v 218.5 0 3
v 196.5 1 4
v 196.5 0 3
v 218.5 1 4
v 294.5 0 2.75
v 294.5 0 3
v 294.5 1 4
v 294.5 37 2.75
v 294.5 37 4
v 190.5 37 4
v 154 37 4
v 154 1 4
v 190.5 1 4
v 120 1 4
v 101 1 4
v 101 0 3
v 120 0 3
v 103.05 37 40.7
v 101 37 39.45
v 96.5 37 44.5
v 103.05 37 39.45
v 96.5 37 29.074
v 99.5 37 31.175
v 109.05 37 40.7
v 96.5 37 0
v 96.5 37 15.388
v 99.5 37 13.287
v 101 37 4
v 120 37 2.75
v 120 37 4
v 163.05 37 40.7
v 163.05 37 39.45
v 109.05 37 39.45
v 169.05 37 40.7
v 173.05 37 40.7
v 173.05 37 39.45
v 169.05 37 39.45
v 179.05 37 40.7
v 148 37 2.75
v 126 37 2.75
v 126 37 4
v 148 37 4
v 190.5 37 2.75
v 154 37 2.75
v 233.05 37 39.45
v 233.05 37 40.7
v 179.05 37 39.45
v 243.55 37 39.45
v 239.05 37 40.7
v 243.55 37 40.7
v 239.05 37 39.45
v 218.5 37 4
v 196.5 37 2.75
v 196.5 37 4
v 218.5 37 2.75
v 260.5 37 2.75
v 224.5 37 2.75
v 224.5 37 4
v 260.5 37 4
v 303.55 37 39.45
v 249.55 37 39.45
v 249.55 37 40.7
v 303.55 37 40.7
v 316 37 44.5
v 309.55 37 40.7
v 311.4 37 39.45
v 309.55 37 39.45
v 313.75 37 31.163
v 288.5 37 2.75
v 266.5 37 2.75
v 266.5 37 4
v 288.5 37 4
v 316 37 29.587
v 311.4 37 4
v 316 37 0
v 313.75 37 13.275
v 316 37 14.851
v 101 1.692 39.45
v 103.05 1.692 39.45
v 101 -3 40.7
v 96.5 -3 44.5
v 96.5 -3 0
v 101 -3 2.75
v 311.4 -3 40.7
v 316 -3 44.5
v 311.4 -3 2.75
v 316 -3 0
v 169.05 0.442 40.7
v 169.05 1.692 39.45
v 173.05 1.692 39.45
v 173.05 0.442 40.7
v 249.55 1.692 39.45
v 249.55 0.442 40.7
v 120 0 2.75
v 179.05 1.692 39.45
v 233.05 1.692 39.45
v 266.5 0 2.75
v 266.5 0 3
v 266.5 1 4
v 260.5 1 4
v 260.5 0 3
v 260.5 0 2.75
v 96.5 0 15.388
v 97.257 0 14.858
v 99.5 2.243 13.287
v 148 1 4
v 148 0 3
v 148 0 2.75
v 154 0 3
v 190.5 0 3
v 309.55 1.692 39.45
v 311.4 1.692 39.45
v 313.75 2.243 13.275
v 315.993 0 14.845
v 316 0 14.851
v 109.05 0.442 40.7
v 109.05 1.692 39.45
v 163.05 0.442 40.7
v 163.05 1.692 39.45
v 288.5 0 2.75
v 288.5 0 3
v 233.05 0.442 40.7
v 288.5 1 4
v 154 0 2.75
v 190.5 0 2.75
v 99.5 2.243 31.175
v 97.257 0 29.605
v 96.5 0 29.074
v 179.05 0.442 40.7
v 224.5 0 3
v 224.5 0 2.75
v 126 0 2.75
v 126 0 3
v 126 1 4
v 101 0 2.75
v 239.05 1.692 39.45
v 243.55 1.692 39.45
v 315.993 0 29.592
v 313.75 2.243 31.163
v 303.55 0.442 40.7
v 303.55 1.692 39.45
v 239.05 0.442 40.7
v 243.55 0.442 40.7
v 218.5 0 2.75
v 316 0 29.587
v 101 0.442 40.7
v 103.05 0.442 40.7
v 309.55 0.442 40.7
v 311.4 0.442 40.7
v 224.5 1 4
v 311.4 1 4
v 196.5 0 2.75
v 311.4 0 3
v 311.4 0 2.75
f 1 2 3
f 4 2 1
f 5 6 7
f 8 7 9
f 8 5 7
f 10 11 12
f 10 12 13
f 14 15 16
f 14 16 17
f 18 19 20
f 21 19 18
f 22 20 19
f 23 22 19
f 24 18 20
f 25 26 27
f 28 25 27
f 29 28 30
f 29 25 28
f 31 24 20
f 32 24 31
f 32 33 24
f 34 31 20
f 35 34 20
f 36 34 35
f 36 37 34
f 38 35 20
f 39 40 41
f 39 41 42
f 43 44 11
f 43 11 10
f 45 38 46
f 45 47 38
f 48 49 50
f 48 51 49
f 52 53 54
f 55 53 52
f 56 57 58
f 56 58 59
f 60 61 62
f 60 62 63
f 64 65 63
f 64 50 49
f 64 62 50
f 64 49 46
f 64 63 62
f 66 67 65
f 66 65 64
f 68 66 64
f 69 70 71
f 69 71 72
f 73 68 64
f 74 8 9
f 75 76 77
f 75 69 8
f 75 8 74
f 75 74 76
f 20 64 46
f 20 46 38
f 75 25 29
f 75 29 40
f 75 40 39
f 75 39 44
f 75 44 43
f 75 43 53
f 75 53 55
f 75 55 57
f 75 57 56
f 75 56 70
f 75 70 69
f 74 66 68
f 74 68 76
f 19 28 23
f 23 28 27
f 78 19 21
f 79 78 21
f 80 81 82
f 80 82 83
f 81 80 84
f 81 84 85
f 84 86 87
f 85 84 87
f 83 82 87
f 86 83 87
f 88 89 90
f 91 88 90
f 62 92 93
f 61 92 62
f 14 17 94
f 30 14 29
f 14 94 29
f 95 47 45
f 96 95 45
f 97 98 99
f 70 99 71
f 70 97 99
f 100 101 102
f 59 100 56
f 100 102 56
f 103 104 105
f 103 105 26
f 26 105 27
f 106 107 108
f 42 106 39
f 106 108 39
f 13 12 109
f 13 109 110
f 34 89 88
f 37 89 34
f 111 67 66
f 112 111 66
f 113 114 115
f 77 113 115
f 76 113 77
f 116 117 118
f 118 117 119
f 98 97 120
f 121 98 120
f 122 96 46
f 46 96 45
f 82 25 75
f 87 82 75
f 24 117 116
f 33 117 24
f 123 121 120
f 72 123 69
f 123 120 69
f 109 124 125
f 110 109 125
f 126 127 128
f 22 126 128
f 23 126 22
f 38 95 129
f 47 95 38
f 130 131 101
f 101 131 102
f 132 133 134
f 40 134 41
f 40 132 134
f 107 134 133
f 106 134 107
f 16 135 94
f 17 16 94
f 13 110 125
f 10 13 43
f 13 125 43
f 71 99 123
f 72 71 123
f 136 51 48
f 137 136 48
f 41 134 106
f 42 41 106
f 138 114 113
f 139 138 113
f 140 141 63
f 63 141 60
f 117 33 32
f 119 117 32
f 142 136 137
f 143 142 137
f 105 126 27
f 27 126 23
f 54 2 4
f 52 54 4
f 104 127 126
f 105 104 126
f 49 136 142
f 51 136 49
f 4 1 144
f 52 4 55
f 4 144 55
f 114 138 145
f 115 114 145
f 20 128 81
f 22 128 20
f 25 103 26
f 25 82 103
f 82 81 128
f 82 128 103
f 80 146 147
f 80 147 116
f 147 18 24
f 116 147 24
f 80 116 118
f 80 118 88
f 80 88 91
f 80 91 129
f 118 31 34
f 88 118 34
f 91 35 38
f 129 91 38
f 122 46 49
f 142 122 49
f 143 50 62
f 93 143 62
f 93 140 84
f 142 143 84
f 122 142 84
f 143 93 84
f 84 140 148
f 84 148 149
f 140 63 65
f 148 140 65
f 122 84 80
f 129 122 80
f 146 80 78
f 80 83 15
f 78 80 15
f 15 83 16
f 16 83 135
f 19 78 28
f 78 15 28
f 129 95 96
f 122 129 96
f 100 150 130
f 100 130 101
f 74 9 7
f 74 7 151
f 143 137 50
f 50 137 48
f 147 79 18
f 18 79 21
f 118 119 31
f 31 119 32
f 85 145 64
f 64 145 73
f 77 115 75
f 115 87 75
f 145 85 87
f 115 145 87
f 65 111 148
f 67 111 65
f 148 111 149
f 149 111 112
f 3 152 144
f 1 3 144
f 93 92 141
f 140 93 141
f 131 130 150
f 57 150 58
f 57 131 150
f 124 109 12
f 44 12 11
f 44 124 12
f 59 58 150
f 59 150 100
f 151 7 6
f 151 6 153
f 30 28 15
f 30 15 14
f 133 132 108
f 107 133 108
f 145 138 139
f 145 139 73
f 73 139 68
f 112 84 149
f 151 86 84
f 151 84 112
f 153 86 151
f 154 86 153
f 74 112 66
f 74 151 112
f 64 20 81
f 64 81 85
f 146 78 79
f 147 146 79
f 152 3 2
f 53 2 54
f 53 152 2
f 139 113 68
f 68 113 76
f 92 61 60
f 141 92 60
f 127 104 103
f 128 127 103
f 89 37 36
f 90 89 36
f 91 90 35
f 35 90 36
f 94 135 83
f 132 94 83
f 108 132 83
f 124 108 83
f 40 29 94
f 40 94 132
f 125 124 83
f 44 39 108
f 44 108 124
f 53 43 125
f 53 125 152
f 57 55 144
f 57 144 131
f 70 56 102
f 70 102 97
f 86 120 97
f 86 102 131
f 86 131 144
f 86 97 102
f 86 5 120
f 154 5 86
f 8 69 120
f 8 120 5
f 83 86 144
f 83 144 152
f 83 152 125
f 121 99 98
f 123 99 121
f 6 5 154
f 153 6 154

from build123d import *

# Parameters (mm, degrees)
BOX031_W               = 85
BOX031_H               = 10
BOX031_DEPTH           = 10
BOX031_PLACEMENT_ANGLE = 45
BOX030_W               = 3
BOX030_H               = 37
BOX030_DEPTH           = 4
BOX032_W               = 4
BOX032_H               = 37
BOX032_DEPTH           = 4
BOX033_W               = 54
BOX033_H               = 37
BOX033_DEPTH           = 4
BOX035_W               = 85
BOX035_H               = 10
BOX035_DEPTH           = 10
BOX035_PLACEMENT_ANGLE = 45
BOX037_W               = 3
BOX037_H               = 37
BOX037_DEPTH           = 4
BOX034_W               = 4
BOX034_H               = 37
BOX034_DEPTH           = 4
BOX036_W               = 54
BOX036_H               = 37
BOX036_DEPTH           = 4
BOX039_W               = 85
BOX039_H               = 10
BOX039_DEPTH           = 10
BOX039_PLACEMENT_ANGLE = 45
BOX041_W               = 3
BOX041_H               = 37
BOX041_DEPTH           = 4
BOX038_W               = 4
BOX038_H               = 37
BOX038_DEPTH           = 4
BOX040_W               = 54
BOX040_H               = 37
BOX040_DEPTH           = 4
BOX045_W               = 71
BOX045_H               = 10
BOX045_DEPTH           = 10
BOX045_PLACEMENT_ANGLE = 45
BOX044_W               = 22
BOX044_H               = 37
BOX044_DEPTH           = 4
BOX042_W               = 18
BOX042_H               = 37
BOX042_DEPTH           = 4
BOX043_W               = 19
BOX043_H               = 37
BOX043_DEPTH           = 4
BOX049_W               = 71
BOX049_H               = 10
BOX049_DEPTH           = 10
BOX049_PLACEMENT_ANGLE = 45
BOX048_W               = 22
BOX048_H               = 37
BOX048_DEPTH           = 4
BOX046_W               = 18
BOX046_H               = 37
BOX046_DEPTH           = 4
BOX047_W               = 19
BOX047_H               = 37
BOX047_DEPTH           = 4
BOX053_W               = 71
BOX053_H               = 10
BOX053_DEPTH           = 10
BOX053_PLACEMENT_ANGLE = 45
BOX052_W               = 22
BOX052_H               = 37
BOX052_DEPTH           = 4
BOX050_W               = 18
BOX050_H               = 37
BOX050_DEPTH           = 4
BOX051_W               = 19
BOX051_H               = 37
BOX051_DEPTH           = 4
BOX029_W               = 210.4
BOX029_H               = 45
BOX029_DEPTH           = 37.95
BOX010_W               = 3
BOX010_H               = 37
BOX010_DEPTH           = 17.92
BOX010_PLACEMENT_ANGLE = 45
BOX008_W               = 3
BOX008_H               = 37
BOX008_DEPTH           = 17.92
BOX008_PLACEMENT_ANGLE = 55
BOX009_W               = 3
BOX009_H               = 37
BOX009_DEPTH           = 17.92
BOX009_PLACEMENT_ANGLE = 125
BOX011_W               = 3
BOX011_H               = 37
BOX011_DEPTH           = 17.92
CUT004_PLACEMENT_ANGLE = 180
BOX007_W               = 3
BOX007_H               = 37
BOX007_DEPTH           = 17.92
BOX007_PLACEMENT_ANGLE = 45
BOX005_W               = 3
BOX005_H               = 37
BOX005_DEPTH           = 17.92
BOX005_PLACEMENT_ANGLE = 55
BOX006_W               = 3
BOX006_H               = 37
BOX006_DEPTH           = 17.92
BOX006_PLACEMENT_ANGLE = 125
BOX004_W               = 3
BOX004_H               = 37
BOX004_DEPTH           = 17.92
BOX002_W               = 219.5
BOX002_H               = 40
BOX002_DEPTH           = 44.5


with BuildPart() as cube031:
    # Box031 → Box031 (new body)
    with BuildSketch(Plane.XY):
        with Locations((42.5, 5)):
            Rectangle(BOX031_W, BOX031_H)
    extrude(amount=BOX031_DEPTH)


with BuildPart() as cube031_1:
    # Box031 placement: moved
    add(cube031.part.moved(Location((13, -8, 35))).rotate(Axis((13, -8, 35), (-1, 0, 0)), BOX031_PLACEMENT_ANGLE))


with BuildPart() as cube030:
    # Box030 → Box030 (new body)
    with BuildSketch(Plane(origin=(21.05, 0, 39.45), x_dir=(1, 0, 0), z_dir=(0, 0, 1))):
        with Locations((1.5, 18.5)):
            Rectangle(BOX030_W, BOX030_H)
    extrude(amount=BOX030_DEPTH)


with BuildPart() as cube032:
    # Box032 → Box032 (new body)
    with BuildSketch(Plane(origin=(90.05, 0, 39.45), x_dir=(1, 0, 0), z_dir=(0, 0, 1))):
        with Locations((2, 18.5)):
            Rectangle(BOX032_W, BOX032_H)
    extrude(amount=BOX032_DEPTH)


with BuildPart() as cut013:
    # Box033 → Box033 (new body)
    with BuildSketch(Plane(origin=(30.05, 0, 39.45), x_dir=(1, 0, 0), z_dir=(0, 0, 1))):
        with Locations((27, 18.5)):
            Rectangle(BOX033_W, BOX033_H)
    extrude(amount=BOX033_DEPTH)

    # Fusion008: union Cube030, Cube032
    add(cube030.part)
    add(cube032.part)

    # Cut013: cut Cube031
    add(cube031_1.part, mode=Mode.SUBTRACT)


with BuildPart() as cut013_1:
    # Cut013 placement: moved
    add(cut013.part.moved(Location((219.5, 0, 0))))


with BuildPart() as cube035:
    # Box035 → Box035 (new body)
    with BuildSketch(Plane.XY):
        with Locations((42.5, 5)):
            Rectangle(BOX035_W, BOX035_H)
    extrude(amount=BOX035_DEPTH)


with BuildPart() as cube035_1:
    # Box035 placement: moved
    add(cube035.part.moved(Location((13, -8, 35))).rotate(Axis((13, -8, 35), (-1, 0, 0)), BOX035_PLACEMENT_ANGLE))


with BuildPart() as cube037:
    # Box037 → Box037 (new body)
    with BuildSketch(Plane(origin=(21.05, 0, 39.45), x_dir=(1, 0, 0), z_dir=(0, 0, 1))):
        with Locations((1.5, 18.5)):
            Rectangle(BOX037_W, BOX037_H)
    extrude(amount=BOX037_DEPTH)


with BuildPart() as cube034:
    # Box034 → Box034 (new body)
    with BuildSketch(Plane(origin=(90.05, 0, 39.45), x_dir=(1, 0, 0), z_dir=(0, 0, 1))):
        with Locations((2, 18.5)):
            Rectangle(BOX034_W, BOX034_H)
    extrude(amount=BOX034_DEPTH)


with BuildPart() as cut014:
    # Box036 → Box036 (new body)
    with BuildSketch(Plane(origin=(30.05, 0, 39.45), x_dir=(1, 0, 0), z_dir=(0, 0, 1))):
        with Locations((27, 18.5)):
            Rectangle(BOX036_W, BOX036_H)
    extrude(amount=BOX036_DEPTH)

    # Fusion009: union Cube037, Cube034
    add(cube037.part)
    add(cube034.part)

    # Cut014: cut Cube035
    add(cube035_1.part, mode=Mode.SUBTRACT)


with BuildPart() as cut014_1:
    # Cut014 placement: moved
    add(cut014.part.moved(Location((149, 0, 0))))


with BuildPart() as cube039:
    # Box039 → Box039 (new body)
    with BuildSketch(Plane.XY):
        with Locations((42.5, 5)):
            Rectangle(BOX039_W, BOX039_H)
    extrude(amount=BOX039_DEPTH)


with BuildPart() as cube039_1:
    # Box039 placement: moved
    add(cube039.part.moved(Location((13, -8, 35))).rotate(Axis((13, -8, 35), (-1, 0, 0)), BOX039_PLACEMENT_ANGLE))


with BuildPart() as cube041:
    # Box041 → Box041 (new body)
    with BuildSketch(Plane(origin=(21.05, 0, 39.45), x_dir=(1, 0, 0), z_dir=(0, 0, 1))):
        with Locations((1.5, 18.5)):
            Rectangle(BOX041_W, BOX041_H)
    extrude(amount=BOX041_DEPTH)


with BuildPart() as cube038:
    # Box038 → Box038 (new body)
    with BuildSketch(Plane(origin=(90.05, 0, 39.45), x_dir=(1, 0, 0), z_dir=(0, 0, 1))):
        with Locations((2, 18.5)):
            Rectangle(BOX038_W, BOX038_H)
    extrude(amount=BOX038_DEPTH)


with BuildPart() as cut015:
    # Box040 → Box040 (new body)
    with BuildSketch(Plane(origin=(30.05, 0, 39.45), x_dir=(1, 0, 0), z_dir=(0, 0, 1))):
        with Locations((27, 18.5)):
            Rectangle(BOX040_W, BOX040_H)
    extrude(amount=BOX040_DEPTH)

    # Fusion010: union Cube041, Cube038
    add(cube041.part)
    add(cube038.part)

    # Cut015: cut Cube039
    add(cube039_1.part, mode=Mode.SUBTRACT)


with BuildPart() as cut015_1:
    # Cut015 placement: moved
    add(cut015.part.moved(Location((79, 0, 0))))


with BuildPart() as cube045:
    # Box045 → Box045 (new body)
    with BuildSketch(Plane.XY):
        with Locations((35.5, 5)):
            Rectangle(BOX045_W, BOX045_H)
    extrude(amount=BOX045_DEPTH)


with BuildPart() as cube045_1:
    # Box045 placement: moved
    add(cube045.part.moved(Location((22, -3, 0))).rotate(Axis((22, -3, 0), (1, 0, 0)), BOX045_PLACEMENT_ANGLE))


with BuildPart() as cube044:
    # Box044 → Box044 (new body)
    with BuildSketch(Plane(origin=(47, 0, 0), x_dir=(1, 0, 0), z_dir=(0, 0, 1))):
        with Locations((11, 18.5)):
            Rectangle(BOX044_W, BOX044_H)
    extrude(amount=BOX044_DEPTH)


with BuildPart() as cube042:
    # Box042 → Box042 (new body)
    with BuildSketch(Plane(origin=(75, 0, 0), x_dir=(1, 0, 0), z_dir=(0, 0, 1))):
        with Locations((9, 18.5)):
            Rectangle(BOX042_W, BOX042_H)
    extrude(amount=BOX042_DEPTH)


with BuildPart() as cut016:
    # Box043 → Box043 (new body)
    with BuildSketch(Plane(origin=(22, 0, 0), x_dir=(1, 0, 0), z_dir=(0, 0, 1))):
        with Locations((9.5, 18.5)):
            Rectangle(BOX043_W, BOX043_H)
    extrude(amount=BOX043_DEPTH)

    # Fusion011: union Cube044, Cube042
    add(cube044.part)
    add(cube042.part)

    # Cut016: cut Cube045
    add(cube045_1.part, mode=Mode.SUBTRACT)


with BuildPart() as cut016_1:
    # Cut016 placement: moved
    add(cut016.part.moved(Location((219.5, 0, 0))))


with BuildPart() as cube049:
    # Box049 → Box049 (new body)
    with BuildSketch(Plane.XY):
        with Locations((35.5, 5)):
            Rectangle(BOX049_W, BOX049_H)
    extrude(amount=BOX049_DEPTH)


with BuildPart() as cube049_1:
    # Box049 placement: moved
    add(cube049.part.moved(Location((22, -3, 0))).rotate(Axis((22, -3, 0), (1, 0, 0)), BOX049_PLACEMENT_ANGLE))


with BuildPart() as cube048:
    # Box048 → Box048 (new body)
    with BuildSketch(Plane(origin=(47, 0, 0), x_dir=(1, 0, 0), z_dir=(0, 0, 1))):
        with Locations((11, 18.5)):
            Rectangle(BOX048_W, BOX048_H)
    extrude(amount=BOX048_DEPTH)


with BuildPart() as cube046:
    # Box046 → Box046 (new body)
    with BuildSketch(Plane(origin=(75, 0, 0), x_dir=(1, 0, 0), z_dir=(0, 0, 1))):
        with Locations((9, 18.5)):
            Rectangle(BOX046_W, BOX046_H)
    extrude(amount=BOX046_DEPTH)


with BuildPart() as cut017:
    # Box047 → Box047 (new body)
    with BuildSketch(Plane(origin=(22, 0, 0), x_dir=(1, 0, 0), z_dir=(0, 0, 1))):
        with Locations((9.5, 18.5)):
            Rectangle(BOX047_W, BOX047_H)
    extrude(amount=BOX047_DEPTH)

    # Fusion012: union Cube048, Cube046
    add(cube048.part)
    add(cube046.part)

    # Cut017: cut Cube049
    add(cube049_1.part, mode=Mode.SUBTRACT)


with BuildPart() as cut017_1:
    # Cut017 placement: moved
    add(cut017.part.moved(Location((149.5, 0, 0))))


with BuildPart() as cube053:
    # Box053 → Box053 (new body)
    with BuildSketch(Plane.XY):
        with Locations((35.5, 5)):
            Rectangle(BOX053_W, BOX053_H)
    extrude(amount=BOX053_DEPTH)


with BuildPart() as cube053_1:
    # Box053 placement: moved
    add(cube053.part.moved(Location((22, -3, 0))).rotate(Axis((22, -3, 0), (1, 0, 0)), BOX053_PLACEMENT_ANGLE))


with BuildPart() as cube052:
    # Box052 → Box052 (new body)
    with BuildSketch(Plane(origin=(47, 0, 0), x_dir=(1, 0, 0), z_dir=(0, 0, 1))):
        with Locations((11, 18.5)):
            Rectangle(BOX052_W, BOX052_H)
    extrude(amount=BOX052_DEPTH)


with BuildPart() as cube050:
    # Box050 → Box050 (new body)
    with BuildSketch(Plane(origin=(75, 0, 0), x_dir=(1, 0, 0), z_dir=(0, 0, 1))):
        with Locations((9, 18.5)):
            Rectangle(BOX050_W, BOX050_H)
    extrude(amount=BOX050_DEPTH)


with BuildPart() as cut018:
    # Box051 → Box051 (new body)
    with BuildSketch(Plane(origin=(22, 0, 0), x_dir=(1, 0, 0), z_dir=(0, 0, 1))):
        with Locations((9.5, 18.5)):
            Rectangle(BOX051_W, BOX051_H)
    extrude(amount=BOX051_DEPTH)

    # Fusion013: union Cube052, Cube050
    add(cube052.part)
    add(cube050.part)

    # Cut018: cut Cube053
    add(cube053_1.part, mode=Mode.SUBTRACT)


with BuildPart() as cut018_1:
    # Cut018 placement: moved
    add(cut018.part.moved(Location((79, 0, 0))))


with BuildPart() as cube029:
    # Box029 → Box029 (new body)
    with BuildSketch(Plane(origin=(101, -4, 2.75), x_dir=(1, 0, 0), z_dir=(0, 0, 1))):
        with Locations((105.2, 22.5)):
            Rectangle(BOX029_W, BOX029_H)
    extrude(amount=BOX029_DEPTH)


with BuildPart() as cube010:
    # Box010 → Box010 (new body)
    with BuildSketch(Plane.XY):
        with Locations((1.5, 18.5)):
            Rectangle(BOX010_W, BOX010_H)
    extrude(amount=BOX010_DEPTH)


with BuildPart() as cube010_1:
    # Box010 placement: moved
    add(cube010.part.moved(Location((314.75, -3, 13.25))).rotate(Axis((314.75, -3, 13.25), (0, 0, 1)), BOX010_PLACEMENT_ANGLE))


with BuildPart() as cube008:
    # Box008 → Box008 (new body)
    with BuildSketch(Plane.XY):
        with Locations((1.5, 18.5)):
            Rectangle(BOX008_W, BOX008_H)
    extrude(amount=BOX008_DEPTH)


with BuildPart() as cube008_1:
    # Box008 placement: moved
    add(cube008.part.moved(Location((313, 0, 12.75))).rotate(Axis((313, 0, 12.75), (0, 1, 0)), BOX008_PLACEMENT_ANGLE))


with BuildPart() as fusion001:
    # Box009 → Box009 (new body)
    with BuildSketch(Plane.XY):
        with Locations((1.5, 18.5)):
            Rectangle(BOX009_W, BOX009_H)
    extrude(amount=BOX009_DEPTH)


with BuildPart() as fusion001_1:
    # Box009 placement: moved
    add(fusion001.part.moved(Location((313, 0, 35.35))).rotate(Axis((313, 0, 35.35), (0, 1, 0)), BOX009_PLACEMENT_ANGLE))

    # Fusion001: union Cube008
    add(cube008_1.part)


with BuildPart() as cut004:
    # Box011 → Box011 (new body)
    with BuildSketch(Plane(origin=(313.75, 0, 13.25), x_dir=(1, 0, 0), z_dir=(0, 0, 1))):
        with Locations((1.5, 18.5)):
            Rectangle(BOX011_W, BOX011_H)
    extrude(amount=BOX011_DEPTH)

    # Cut003: cut Fusion001
    add(fusion001_1.part, mode=Mode.SUBTRACT)

    # Cut004: cut Cube010
    add(cube010_1.part, mode=Mode.SUBTRACT)


with BuildPart() as cut004_1:
    # Cut004 placement: moved
    add(cut004.part.moved(Location((413.25, 0, 44.45))).rotate(Axis((413.25, 0, 44.45), (0, 1, 0)), CUT004_PLACEMENT_ANGLE))


with BuildPart() as cube007:
    # Box007 → Box007 (new body)
    with BuildSketch(Plane.XY):
        with Locations((1.5, 18.5)):
            Rectangle(BOX007_W, BOX007_H)
    extrude(amount=BOX007_DEPTH)


with BuildPart() as cube007_1:
    # Box007 placement: moved
    add(cube007.part.moved(Location((314.75, -3, 13.25))).rotate(Axis((314.75, -3, 13.25), (0, 0, 1)), BOX007_PLACEMENT_ANGLE))


with BuildPart() as cube005:
    # Box005 → Box005 (new body)
    with BuildSketch(Plane.XY):
        with Locations((1.5, 18.5)):
            Rectangle(BOX005_W, BOX005_H)
    extrude(amount=BOX005_DEPTH)


with BuildPart() as cube005_1:
    # Box005 placement: moved
    add(cube005.part.moved(Location((313, 0, 12.75))).rotate(Axis((313, 0, 12.75), (0, 1, 0)), BOX005_PLACEMENT_ANGLE))


with BuildPart() as fusion:
    # Box006 → Box006 (new body)
    with BuildSketch(Plane.XY):
        with Locations((1.5, 18.5)):
            Rectangle(BOX006_W, BOX006_H)
    extrude(amount=BOX006_DEPTH)


with BuildPart() as fusion_1:
    # Box006 placement: moved
    add(fusion.part.moved(Location((313, 0, 35.35))).rotate(Axis((313, 0, 35.35), (0, 1, 0)), BOX006_PLACEMENT_ANGLE))

    # Fusion: union Cube005
    add(cube005_1.part)


with BuildPart() as cut001:
    # Box004 → Box004 (new body)
    with BuildSketch(Plane(origin=(313.75, 0, 13.25), x_dir=(1, 0, 0), z_dir=(0, 0, 1))):
        with Locations((1.5, 18.5)):
            Rectangle(BOX004_W, BOX004_H)
    extrude(amount=BOX004_DEPTH)

    # Cut: cut Fusion
    add(fusion_1.part, mode=Mode.SUBTRACT)

    # Cut001: cut Cube007
    add(cube007_1.part, mode=Mode.SUBTRACT)


with BuildPart() as rack_middle_wider:
    # Box002 → Box002 (new body)
    with BuildSketch(Plane(origin=(96.5, -3, 0), x_dir=(1, 0, 0), z_dir=(0, 0, 1))):
        with Locations((109.75, 20)):
            Rectangle(BOX002_W, BOX002_H)
    extrude(amount=BOX002_DEPTH)

    # Cut002: cut Cut001
    add(cut001.part, mode=Mode.SUBTRACT)

    # Cut005: cut Cut004
    add(cut004_1.part, mode=Mode.SUBTRACT)

    # Cut012: cut Cube029
    add(cube029.part, mode=Mode.SUBTRACT)

    # Fusion014: union Cut013, Cut014, Cut015, Cut016, Cut017, Cut018
    add(cut013_1.part)
    add(cut014_1.part)
    add(cut015_1.part)
    add(cut016_1.part)
    add(cut017_1.part)
    add(cut018_1.part)


solid = rack_middle_wider.part
